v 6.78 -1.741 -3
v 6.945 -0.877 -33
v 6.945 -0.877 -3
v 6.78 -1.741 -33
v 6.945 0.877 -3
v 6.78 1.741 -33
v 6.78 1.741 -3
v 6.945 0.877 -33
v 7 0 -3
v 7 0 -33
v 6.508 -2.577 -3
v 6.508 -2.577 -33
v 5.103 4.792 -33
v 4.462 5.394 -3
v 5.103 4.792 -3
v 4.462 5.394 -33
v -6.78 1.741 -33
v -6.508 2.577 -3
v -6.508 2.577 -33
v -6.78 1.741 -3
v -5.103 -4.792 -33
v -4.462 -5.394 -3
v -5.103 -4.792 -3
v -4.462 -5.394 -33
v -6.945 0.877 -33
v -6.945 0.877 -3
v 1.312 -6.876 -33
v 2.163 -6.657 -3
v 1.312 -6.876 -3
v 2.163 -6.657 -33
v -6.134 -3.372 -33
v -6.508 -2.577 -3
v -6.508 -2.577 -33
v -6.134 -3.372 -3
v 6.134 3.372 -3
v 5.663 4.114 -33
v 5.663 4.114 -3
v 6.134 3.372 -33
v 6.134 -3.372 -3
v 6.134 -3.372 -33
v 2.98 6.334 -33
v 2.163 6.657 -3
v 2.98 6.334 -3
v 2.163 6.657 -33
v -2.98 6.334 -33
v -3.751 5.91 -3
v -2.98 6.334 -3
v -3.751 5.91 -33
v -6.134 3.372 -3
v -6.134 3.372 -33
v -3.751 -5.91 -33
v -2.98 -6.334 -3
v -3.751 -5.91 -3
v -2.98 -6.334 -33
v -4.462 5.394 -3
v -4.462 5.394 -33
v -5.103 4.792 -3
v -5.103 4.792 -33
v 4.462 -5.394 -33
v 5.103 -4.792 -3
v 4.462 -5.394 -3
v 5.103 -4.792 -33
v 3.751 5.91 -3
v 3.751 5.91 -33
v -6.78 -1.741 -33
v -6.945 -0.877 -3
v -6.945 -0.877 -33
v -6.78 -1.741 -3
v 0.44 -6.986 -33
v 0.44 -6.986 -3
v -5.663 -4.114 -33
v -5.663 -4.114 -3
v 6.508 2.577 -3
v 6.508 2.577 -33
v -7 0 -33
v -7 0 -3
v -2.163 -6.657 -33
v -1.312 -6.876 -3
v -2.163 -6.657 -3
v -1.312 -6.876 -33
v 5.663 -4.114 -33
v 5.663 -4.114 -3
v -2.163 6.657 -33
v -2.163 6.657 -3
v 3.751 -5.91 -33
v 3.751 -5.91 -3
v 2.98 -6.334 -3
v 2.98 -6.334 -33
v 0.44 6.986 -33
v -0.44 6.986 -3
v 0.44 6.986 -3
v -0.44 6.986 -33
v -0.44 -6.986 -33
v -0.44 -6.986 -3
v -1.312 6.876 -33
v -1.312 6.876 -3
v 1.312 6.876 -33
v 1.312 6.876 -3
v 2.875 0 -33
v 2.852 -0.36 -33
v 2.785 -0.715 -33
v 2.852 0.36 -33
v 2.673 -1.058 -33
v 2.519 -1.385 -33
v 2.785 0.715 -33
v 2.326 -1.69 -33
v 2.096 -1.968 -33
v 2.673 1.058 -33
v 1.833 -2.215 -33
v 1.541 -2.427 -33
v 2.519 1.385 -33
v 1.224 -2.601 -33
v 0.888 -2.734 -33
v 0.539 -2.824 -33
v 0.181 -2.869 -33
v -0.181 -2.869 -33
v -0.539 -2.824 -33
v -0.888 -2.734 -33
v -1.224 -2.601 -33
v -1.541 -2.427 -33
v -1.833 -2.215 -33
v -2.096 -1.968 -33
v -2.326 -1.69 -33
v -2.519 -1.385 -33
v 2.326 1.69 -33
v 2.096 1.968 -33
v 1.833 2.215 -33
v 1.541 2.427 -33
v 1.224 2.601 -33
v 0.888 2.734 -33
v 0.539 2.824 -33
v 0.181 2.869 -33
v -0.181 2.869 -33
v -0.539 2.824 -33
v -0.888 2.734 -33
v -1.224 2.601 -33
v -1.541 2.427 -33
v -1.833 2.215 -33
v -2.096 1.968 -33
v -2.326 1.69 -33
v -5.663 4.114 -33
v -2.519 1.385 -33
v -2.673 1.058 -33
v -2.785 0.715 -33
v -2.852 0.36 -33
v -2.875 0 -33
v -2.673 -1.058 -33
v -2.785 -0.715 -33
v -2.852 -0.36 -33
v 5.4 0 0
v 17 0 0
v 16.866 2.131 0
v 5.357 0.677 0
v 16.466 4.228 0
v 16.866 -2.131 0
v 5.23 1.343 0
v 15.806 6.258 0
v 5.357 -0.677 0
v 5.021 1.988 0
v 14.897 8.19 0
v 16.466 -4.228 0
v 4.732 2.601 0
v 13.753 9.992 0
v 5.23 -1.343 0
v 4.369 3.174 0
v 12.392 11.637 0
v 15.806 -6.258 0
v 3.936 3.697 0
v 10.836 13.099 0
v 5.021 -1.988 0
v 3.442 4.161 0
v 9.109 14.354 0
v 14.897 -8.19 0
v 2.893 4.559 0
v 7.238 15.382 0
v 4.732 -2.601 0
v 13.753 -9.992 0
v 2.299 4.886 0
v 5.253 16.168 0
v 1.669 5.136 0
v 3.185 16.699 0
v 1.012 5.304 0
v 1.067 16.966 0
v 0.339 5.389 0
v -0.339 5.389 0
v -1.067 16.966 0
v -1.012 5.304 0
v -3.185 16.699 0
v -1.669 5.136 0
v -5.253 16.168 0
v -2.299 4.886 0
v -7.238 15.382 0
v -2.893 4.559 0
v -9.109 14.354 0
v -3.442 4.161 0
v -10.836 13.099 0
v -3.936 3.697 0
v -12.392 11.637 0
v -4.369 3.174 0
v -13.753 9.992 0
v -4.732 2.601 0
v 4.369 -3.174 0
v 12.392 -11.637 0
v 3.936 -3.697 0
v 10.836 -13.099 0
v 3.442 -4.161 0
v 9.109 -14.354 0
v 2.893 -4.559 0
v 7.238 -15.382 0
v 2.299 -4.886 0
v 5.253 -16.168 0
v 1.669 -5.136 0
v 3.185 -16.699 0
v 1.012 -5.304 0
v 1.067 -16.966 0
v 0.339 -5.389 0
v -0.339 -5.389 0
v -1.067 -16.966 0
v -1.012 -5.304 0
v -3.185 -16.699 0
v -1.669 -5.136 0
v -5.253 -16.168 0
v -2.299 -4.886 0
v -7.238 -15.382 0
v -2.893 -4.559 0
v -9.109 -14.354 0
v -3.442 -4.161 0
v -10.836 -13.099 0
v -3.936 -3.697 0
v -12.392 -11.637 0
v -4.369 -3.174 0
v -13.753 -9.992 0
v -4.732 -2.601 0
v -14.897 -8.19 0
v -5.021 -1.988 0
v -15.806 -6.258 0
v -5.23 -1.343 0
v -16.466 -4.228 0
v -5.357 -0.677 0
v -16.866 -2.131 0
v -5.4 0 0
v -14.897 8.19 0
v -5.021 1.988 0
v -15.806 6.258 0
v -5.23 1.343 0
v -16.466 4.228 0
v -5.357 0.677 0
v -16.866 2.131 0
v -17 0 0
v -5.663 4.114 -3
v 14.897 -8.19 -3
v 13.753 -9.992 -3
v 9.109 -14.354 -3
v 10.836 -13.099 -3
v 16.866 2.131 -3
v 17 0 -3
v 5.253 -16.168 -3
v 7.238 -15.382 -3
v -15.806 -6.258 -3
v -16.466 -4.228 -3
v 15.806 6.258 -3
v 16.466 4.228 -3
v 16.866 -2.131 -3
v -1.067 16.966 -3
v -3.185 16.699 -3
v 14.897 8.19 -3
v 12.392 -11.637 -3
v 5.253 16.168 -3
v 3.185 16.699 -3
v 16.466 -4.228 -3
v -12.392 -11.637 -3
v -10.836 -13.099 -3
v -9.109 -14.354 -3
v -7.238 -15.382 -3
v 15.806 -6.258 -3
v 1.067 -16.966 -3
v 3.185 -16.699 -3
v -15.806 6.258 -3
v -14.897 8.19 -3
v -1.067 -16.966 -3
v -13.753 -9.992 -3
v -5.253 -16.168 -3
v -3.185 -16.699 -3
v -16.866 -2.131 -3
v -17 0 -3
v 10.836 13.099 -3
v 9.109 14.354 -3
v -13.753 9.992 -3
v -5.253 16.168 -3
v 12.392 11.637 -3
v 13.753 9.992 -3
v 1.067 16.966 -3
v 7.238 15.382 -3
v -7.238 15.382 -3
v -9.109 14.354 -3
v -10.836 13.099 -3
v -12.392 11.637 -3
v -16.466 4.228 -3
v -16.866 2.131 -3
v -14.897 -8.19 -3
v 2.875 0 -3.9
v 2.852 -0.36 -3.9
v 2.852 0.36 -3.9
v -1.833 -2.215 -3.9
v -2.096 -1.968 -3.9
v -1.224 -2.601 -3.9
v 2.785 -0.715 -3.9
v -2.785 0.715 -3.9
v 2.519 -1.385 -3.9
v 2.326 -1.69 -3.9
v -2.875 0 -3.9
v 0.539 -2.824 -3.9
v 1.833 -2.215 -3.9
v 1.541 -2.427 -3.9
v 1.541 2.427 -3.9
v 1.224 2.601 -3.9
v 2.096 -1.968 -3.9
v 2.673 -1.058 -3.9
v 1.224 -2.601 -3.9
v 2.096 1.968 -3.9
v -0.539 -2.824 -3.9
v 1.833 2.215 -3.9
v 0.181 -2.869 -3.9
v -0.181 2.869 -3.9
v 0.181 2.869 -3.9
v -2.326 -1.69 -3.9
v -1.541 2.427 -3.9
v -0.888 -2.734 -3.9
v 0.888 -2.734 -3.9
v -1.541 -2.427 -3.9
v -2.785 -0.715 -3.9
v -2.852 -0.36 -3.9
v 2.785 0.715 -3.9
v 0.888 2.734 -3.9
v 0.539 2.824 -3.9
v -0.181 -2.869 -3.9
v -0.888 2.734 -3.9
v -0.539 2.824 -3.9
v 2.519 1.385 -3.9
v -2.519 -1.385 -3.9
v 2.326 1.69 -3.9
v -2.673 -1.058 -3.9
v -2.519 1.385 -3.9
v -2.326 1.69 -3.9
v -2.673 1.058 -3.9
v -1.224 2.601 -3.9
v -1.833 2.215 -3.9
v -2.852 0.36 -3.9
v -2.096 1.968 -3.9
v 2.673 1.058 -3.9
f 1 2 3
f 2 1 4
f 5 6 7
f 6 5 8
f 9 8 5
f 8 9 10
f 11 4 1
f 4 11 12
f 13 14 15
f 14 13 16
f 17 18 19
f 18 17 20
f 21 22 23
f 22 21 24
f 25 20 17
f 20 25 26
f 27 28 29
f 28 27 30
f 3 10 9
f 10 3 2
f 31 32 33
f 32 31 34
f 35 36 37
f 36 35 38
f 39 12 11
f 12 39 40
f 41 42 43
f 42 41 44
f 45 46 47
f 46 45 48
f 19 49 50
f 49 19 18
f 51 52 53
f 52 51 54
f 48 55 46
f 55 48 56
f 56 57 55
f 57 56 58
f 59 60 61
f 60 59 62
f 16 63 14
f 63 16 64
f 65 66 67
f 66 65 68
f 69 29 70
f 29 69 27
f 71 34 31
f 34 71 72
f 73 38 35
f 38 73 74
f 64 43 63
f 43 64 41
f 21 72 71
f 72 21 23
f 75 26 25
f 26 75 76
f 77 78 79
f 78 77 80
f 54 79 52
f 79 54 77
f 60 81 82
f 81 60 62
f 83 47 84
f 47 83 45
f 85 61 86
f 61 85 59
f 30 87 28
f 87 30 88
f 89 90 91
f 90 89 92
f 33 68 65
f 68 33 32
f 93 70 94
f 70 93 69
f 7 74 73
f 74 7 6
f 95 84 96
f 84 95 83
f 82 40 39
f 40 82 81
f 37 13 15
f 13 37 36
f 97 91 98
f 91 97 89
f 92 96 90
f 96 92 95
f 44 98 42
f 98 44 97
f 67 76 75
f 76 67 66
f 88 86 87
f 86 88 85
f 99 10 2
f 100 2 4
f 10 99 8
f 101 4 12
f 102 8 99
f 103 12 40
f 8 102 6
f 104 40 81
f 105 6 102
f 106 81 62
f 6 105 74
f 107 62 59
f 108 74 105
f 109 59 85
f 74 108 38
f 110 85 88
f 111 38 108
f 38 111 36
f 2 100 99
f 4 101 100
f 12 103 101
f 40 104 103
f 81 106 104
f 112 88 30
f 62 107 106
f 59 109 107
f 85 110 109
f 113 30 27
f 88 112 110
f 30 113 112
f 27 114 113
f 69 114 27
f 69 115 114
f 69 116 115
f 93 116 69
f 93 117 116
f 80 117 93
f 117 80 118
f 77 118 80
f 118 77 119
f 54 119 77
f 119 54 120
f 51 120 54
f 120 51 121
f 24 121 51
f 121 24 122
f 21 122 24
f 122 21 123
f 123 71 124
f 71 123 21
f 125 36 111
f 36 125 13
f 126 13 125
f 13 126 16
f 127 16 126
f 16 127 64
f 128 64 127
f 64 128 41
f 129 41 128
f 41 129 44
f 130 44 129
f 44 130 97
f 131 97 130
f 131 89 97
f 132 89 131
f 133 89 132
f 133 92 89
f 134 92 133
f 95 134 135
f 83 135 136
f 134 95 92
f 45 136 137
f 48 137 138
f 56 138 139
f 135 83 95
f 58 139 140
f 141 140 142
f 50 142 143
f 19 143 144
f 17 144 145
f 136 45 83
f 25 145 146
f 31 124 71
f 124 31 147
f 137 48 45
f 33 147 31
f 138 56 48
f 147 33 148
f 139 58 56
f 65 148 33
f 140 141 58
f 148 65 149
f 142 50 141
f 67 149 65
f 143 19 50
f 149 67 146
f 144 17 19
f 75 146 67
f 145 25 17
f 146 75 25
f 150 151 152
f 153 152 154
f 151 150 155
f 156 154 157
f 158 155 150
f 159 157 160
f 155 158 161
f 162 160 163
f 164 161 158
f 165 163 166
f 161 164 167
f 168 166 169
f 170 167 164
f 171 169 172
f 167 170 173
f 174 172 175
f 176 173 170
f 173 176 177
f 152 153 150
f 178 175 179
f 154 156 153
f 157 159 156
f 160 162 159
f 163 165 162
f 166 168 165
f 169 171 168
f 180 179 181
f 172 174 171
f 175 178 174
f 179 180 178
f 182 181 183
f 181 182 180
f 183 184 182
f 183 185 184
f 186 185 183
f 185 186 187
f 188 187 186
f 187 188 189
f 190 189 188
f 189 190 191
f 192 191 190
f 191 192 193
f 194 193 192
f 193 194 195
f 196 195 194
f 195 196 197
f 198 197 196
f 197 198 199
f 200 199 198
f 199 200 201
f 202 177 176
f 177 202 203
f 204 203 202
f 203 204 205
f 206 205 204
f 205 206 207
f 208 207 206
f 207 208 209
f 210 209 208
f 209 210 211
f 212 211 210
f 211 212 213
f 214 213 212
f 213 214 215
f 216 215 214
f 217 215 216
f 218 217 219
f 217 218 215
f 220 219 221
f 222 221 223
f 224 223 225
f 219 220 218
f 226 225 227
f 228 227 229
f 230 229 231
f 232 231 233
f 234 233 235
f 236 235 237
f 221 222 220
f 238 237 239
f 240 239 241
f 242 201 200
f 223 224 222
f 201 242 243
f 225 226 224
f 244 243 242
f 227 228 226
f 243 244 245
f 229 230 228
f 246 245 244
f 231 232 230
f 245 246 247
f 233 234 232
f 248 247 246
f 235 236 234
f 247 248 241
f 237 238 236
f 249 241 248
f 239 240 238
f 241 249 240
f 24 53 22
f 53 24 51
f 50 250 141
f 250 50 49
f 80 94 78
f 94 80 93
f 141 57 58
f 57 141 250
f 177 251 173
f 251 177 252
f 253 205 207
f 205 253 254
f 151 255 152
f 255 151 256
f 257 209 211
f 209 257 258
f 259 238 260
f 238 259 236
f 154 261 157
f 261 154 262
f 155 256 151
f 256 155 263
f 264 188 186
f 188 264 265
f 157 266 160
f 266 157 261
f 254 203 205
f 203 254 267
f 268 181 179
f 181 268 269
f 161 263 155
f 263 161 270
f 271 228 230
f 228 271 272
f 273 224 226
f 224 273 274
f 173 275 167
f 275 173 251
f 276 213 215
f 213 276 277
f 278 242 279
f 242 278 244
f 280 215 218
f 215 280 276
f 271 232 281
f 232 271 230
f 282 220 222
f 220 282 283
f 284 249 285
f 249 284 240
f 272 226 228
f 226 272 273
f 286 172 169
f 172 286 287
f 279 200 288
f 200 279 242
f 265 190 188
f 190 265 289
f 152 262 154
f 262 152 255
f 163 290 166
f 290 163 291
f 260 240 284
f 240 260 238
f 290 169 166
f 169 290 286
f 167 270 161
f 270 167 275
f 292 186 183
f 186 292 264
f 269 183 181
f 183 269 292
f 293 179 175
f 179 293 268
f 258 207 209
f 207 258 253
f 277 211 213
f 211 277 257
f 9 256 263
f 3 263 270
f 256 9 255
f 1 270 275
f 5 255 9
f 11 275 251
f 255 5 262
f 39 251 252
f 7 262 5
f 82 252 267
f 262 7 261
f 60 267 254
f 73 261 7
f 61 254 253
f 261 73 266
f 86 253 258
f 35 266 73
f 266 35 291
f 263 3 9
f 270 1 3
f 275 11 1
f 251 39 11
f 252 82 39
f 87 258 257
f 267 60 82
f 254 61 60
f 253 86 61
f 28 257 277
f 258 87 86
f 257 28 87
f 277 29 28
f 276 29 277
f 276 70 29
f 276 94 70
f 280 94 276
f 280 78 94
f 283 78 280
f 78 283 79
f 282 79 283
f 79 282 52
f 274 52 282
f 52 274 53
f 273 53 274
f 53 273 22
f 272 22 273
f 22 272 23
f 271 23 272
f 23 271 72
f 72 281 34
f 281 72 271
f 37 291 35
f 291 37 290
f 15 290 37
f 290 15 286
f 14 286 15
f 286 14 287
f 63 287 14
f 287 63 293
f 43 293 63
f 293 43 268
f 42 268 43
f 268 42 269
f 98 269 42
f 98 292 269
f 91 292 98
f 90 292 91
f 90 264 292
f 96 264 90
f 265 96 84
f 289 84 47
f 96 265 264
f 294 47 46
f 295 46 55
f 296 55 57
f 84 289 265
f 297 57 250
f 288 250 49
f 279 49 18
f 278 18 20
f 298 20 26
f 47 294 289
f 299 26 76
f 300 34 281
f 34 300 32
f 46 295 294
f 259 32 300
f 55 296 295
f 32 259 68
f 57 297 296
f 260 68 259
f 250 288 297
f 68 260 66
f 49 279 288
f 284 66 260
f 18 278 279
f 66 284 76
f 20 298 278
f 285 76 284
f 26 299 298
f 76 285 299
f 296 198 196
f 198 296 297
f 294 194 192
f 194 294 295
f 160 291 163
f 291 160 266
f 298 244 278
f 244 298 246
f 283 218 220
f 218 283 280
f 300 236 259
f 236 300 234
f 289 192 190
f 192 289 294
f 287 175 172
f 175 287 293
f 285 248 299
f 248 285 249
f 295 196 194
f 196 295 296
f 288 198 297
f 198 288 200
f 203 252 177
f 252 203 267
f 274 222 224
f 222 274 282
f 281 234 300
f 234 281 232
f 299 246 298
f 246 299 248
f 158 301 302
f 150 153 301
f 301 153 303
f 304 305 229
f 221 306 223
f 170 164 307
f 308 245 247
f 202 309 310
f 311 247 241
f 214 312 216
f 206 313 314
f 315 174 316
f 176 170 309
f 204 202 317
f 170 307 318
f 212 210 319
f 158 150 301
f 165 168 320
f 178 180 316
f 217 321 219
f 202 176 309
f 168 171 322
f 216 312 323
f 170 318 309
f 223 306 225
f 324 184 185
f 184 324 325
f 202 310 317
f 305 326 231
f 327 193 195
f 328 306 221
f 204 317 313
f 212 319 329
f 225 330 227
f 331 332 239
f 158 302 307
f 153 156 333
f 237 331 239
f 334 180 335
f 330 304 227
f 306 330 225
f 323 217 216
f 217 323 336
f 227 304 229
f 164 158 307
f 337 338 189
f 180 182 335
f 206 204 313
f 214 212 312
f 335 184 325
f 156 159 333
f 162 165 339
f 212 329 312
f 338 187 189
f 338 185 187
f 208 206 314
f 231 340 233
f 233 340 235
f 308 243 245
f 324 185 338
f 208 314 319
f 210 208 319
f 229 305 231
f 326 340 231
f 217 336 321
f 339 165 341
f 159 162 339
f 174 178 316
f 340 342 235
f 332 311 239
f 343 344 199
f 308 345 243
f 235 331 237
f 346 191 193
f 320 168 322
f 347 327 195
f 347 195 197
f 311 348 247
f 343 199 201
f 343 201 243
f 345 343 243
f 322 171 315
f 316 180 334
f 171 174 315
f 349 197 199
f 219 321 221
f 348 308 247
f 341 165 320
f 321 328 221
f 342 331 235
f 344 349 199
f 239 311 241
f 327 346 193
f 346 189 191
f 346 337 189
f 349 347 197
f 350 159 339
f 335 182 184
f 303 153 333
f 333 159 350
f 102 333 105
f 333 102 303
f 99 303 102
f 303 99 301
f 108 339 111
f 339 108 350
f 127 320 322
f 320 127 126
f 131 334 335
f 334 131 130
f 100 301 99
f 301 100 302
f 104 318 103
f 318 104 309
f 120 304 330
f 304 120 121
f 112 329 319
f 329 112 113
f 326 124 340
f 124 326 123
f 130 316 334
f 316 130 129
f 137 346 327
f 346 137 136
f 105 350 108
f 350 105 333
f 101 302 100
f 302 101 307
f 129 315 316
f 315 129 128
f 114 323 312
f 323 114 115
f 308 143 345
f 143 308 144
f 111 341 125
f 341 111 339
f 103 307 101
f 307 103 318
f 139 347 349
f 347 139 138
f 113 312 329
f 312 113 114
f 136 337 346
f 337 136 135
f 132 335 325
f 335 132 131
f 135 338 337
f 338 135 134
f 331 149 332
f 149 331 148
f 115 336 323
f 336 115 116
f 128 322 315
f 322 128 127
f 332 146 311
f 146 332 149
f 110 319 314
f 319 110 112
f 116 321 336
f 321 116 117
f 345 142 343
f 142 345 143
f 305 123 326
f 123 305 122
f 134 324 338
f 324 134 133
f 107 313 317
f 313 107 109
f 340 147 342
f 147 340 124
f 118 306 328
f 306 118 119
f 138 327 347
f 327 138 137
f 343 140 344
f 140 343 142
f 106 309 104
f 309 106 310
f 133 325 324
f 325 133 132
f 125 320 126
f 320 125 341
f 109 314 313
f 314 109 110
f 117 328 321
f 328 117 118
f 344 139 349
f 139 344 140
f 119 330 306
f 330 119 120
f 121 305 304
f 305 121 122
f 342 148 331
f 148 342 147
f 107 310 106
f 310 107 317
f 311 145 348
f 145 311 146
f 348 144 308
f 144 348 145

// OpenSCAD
$fn = 50;


difference() {
	union() {
		translate(v = [0, 0, -33.0000000000]) {
			cylinder(h = 33, r = 7.0000000000);
		}
		translate(v = [0, 0, -3.0000000000]) {
			cylinder(h = 3, r = 17.0000000000);
		}
	}
	union() {
		translate(v = [0, 0, 0]) {
			rotate(a = [0, 0, 0]) {
				difference() {
					union() {
						#translate(v = [0, 0, -33.0000000000]) {
							cylinder(h = 33, r = 2.6000000000);
						}
						#translate(v = [0, 0, -3.9000000000]) {
							cylinder(h = 3.9000000000, r1 = 2.8750000000, r2 = 5.4000000000);
						}
						#translate(v = [0, 0, -33.0000000000]) {
							cylinder(h = 33, r = 2.8750000000);
						}
						#translate(v = [0, 0, -33.0000000000]) {
							cylinder(h = 33, r = 2.6000000000);
						}
					}
					union();
				}
			}
		}
	}
}
